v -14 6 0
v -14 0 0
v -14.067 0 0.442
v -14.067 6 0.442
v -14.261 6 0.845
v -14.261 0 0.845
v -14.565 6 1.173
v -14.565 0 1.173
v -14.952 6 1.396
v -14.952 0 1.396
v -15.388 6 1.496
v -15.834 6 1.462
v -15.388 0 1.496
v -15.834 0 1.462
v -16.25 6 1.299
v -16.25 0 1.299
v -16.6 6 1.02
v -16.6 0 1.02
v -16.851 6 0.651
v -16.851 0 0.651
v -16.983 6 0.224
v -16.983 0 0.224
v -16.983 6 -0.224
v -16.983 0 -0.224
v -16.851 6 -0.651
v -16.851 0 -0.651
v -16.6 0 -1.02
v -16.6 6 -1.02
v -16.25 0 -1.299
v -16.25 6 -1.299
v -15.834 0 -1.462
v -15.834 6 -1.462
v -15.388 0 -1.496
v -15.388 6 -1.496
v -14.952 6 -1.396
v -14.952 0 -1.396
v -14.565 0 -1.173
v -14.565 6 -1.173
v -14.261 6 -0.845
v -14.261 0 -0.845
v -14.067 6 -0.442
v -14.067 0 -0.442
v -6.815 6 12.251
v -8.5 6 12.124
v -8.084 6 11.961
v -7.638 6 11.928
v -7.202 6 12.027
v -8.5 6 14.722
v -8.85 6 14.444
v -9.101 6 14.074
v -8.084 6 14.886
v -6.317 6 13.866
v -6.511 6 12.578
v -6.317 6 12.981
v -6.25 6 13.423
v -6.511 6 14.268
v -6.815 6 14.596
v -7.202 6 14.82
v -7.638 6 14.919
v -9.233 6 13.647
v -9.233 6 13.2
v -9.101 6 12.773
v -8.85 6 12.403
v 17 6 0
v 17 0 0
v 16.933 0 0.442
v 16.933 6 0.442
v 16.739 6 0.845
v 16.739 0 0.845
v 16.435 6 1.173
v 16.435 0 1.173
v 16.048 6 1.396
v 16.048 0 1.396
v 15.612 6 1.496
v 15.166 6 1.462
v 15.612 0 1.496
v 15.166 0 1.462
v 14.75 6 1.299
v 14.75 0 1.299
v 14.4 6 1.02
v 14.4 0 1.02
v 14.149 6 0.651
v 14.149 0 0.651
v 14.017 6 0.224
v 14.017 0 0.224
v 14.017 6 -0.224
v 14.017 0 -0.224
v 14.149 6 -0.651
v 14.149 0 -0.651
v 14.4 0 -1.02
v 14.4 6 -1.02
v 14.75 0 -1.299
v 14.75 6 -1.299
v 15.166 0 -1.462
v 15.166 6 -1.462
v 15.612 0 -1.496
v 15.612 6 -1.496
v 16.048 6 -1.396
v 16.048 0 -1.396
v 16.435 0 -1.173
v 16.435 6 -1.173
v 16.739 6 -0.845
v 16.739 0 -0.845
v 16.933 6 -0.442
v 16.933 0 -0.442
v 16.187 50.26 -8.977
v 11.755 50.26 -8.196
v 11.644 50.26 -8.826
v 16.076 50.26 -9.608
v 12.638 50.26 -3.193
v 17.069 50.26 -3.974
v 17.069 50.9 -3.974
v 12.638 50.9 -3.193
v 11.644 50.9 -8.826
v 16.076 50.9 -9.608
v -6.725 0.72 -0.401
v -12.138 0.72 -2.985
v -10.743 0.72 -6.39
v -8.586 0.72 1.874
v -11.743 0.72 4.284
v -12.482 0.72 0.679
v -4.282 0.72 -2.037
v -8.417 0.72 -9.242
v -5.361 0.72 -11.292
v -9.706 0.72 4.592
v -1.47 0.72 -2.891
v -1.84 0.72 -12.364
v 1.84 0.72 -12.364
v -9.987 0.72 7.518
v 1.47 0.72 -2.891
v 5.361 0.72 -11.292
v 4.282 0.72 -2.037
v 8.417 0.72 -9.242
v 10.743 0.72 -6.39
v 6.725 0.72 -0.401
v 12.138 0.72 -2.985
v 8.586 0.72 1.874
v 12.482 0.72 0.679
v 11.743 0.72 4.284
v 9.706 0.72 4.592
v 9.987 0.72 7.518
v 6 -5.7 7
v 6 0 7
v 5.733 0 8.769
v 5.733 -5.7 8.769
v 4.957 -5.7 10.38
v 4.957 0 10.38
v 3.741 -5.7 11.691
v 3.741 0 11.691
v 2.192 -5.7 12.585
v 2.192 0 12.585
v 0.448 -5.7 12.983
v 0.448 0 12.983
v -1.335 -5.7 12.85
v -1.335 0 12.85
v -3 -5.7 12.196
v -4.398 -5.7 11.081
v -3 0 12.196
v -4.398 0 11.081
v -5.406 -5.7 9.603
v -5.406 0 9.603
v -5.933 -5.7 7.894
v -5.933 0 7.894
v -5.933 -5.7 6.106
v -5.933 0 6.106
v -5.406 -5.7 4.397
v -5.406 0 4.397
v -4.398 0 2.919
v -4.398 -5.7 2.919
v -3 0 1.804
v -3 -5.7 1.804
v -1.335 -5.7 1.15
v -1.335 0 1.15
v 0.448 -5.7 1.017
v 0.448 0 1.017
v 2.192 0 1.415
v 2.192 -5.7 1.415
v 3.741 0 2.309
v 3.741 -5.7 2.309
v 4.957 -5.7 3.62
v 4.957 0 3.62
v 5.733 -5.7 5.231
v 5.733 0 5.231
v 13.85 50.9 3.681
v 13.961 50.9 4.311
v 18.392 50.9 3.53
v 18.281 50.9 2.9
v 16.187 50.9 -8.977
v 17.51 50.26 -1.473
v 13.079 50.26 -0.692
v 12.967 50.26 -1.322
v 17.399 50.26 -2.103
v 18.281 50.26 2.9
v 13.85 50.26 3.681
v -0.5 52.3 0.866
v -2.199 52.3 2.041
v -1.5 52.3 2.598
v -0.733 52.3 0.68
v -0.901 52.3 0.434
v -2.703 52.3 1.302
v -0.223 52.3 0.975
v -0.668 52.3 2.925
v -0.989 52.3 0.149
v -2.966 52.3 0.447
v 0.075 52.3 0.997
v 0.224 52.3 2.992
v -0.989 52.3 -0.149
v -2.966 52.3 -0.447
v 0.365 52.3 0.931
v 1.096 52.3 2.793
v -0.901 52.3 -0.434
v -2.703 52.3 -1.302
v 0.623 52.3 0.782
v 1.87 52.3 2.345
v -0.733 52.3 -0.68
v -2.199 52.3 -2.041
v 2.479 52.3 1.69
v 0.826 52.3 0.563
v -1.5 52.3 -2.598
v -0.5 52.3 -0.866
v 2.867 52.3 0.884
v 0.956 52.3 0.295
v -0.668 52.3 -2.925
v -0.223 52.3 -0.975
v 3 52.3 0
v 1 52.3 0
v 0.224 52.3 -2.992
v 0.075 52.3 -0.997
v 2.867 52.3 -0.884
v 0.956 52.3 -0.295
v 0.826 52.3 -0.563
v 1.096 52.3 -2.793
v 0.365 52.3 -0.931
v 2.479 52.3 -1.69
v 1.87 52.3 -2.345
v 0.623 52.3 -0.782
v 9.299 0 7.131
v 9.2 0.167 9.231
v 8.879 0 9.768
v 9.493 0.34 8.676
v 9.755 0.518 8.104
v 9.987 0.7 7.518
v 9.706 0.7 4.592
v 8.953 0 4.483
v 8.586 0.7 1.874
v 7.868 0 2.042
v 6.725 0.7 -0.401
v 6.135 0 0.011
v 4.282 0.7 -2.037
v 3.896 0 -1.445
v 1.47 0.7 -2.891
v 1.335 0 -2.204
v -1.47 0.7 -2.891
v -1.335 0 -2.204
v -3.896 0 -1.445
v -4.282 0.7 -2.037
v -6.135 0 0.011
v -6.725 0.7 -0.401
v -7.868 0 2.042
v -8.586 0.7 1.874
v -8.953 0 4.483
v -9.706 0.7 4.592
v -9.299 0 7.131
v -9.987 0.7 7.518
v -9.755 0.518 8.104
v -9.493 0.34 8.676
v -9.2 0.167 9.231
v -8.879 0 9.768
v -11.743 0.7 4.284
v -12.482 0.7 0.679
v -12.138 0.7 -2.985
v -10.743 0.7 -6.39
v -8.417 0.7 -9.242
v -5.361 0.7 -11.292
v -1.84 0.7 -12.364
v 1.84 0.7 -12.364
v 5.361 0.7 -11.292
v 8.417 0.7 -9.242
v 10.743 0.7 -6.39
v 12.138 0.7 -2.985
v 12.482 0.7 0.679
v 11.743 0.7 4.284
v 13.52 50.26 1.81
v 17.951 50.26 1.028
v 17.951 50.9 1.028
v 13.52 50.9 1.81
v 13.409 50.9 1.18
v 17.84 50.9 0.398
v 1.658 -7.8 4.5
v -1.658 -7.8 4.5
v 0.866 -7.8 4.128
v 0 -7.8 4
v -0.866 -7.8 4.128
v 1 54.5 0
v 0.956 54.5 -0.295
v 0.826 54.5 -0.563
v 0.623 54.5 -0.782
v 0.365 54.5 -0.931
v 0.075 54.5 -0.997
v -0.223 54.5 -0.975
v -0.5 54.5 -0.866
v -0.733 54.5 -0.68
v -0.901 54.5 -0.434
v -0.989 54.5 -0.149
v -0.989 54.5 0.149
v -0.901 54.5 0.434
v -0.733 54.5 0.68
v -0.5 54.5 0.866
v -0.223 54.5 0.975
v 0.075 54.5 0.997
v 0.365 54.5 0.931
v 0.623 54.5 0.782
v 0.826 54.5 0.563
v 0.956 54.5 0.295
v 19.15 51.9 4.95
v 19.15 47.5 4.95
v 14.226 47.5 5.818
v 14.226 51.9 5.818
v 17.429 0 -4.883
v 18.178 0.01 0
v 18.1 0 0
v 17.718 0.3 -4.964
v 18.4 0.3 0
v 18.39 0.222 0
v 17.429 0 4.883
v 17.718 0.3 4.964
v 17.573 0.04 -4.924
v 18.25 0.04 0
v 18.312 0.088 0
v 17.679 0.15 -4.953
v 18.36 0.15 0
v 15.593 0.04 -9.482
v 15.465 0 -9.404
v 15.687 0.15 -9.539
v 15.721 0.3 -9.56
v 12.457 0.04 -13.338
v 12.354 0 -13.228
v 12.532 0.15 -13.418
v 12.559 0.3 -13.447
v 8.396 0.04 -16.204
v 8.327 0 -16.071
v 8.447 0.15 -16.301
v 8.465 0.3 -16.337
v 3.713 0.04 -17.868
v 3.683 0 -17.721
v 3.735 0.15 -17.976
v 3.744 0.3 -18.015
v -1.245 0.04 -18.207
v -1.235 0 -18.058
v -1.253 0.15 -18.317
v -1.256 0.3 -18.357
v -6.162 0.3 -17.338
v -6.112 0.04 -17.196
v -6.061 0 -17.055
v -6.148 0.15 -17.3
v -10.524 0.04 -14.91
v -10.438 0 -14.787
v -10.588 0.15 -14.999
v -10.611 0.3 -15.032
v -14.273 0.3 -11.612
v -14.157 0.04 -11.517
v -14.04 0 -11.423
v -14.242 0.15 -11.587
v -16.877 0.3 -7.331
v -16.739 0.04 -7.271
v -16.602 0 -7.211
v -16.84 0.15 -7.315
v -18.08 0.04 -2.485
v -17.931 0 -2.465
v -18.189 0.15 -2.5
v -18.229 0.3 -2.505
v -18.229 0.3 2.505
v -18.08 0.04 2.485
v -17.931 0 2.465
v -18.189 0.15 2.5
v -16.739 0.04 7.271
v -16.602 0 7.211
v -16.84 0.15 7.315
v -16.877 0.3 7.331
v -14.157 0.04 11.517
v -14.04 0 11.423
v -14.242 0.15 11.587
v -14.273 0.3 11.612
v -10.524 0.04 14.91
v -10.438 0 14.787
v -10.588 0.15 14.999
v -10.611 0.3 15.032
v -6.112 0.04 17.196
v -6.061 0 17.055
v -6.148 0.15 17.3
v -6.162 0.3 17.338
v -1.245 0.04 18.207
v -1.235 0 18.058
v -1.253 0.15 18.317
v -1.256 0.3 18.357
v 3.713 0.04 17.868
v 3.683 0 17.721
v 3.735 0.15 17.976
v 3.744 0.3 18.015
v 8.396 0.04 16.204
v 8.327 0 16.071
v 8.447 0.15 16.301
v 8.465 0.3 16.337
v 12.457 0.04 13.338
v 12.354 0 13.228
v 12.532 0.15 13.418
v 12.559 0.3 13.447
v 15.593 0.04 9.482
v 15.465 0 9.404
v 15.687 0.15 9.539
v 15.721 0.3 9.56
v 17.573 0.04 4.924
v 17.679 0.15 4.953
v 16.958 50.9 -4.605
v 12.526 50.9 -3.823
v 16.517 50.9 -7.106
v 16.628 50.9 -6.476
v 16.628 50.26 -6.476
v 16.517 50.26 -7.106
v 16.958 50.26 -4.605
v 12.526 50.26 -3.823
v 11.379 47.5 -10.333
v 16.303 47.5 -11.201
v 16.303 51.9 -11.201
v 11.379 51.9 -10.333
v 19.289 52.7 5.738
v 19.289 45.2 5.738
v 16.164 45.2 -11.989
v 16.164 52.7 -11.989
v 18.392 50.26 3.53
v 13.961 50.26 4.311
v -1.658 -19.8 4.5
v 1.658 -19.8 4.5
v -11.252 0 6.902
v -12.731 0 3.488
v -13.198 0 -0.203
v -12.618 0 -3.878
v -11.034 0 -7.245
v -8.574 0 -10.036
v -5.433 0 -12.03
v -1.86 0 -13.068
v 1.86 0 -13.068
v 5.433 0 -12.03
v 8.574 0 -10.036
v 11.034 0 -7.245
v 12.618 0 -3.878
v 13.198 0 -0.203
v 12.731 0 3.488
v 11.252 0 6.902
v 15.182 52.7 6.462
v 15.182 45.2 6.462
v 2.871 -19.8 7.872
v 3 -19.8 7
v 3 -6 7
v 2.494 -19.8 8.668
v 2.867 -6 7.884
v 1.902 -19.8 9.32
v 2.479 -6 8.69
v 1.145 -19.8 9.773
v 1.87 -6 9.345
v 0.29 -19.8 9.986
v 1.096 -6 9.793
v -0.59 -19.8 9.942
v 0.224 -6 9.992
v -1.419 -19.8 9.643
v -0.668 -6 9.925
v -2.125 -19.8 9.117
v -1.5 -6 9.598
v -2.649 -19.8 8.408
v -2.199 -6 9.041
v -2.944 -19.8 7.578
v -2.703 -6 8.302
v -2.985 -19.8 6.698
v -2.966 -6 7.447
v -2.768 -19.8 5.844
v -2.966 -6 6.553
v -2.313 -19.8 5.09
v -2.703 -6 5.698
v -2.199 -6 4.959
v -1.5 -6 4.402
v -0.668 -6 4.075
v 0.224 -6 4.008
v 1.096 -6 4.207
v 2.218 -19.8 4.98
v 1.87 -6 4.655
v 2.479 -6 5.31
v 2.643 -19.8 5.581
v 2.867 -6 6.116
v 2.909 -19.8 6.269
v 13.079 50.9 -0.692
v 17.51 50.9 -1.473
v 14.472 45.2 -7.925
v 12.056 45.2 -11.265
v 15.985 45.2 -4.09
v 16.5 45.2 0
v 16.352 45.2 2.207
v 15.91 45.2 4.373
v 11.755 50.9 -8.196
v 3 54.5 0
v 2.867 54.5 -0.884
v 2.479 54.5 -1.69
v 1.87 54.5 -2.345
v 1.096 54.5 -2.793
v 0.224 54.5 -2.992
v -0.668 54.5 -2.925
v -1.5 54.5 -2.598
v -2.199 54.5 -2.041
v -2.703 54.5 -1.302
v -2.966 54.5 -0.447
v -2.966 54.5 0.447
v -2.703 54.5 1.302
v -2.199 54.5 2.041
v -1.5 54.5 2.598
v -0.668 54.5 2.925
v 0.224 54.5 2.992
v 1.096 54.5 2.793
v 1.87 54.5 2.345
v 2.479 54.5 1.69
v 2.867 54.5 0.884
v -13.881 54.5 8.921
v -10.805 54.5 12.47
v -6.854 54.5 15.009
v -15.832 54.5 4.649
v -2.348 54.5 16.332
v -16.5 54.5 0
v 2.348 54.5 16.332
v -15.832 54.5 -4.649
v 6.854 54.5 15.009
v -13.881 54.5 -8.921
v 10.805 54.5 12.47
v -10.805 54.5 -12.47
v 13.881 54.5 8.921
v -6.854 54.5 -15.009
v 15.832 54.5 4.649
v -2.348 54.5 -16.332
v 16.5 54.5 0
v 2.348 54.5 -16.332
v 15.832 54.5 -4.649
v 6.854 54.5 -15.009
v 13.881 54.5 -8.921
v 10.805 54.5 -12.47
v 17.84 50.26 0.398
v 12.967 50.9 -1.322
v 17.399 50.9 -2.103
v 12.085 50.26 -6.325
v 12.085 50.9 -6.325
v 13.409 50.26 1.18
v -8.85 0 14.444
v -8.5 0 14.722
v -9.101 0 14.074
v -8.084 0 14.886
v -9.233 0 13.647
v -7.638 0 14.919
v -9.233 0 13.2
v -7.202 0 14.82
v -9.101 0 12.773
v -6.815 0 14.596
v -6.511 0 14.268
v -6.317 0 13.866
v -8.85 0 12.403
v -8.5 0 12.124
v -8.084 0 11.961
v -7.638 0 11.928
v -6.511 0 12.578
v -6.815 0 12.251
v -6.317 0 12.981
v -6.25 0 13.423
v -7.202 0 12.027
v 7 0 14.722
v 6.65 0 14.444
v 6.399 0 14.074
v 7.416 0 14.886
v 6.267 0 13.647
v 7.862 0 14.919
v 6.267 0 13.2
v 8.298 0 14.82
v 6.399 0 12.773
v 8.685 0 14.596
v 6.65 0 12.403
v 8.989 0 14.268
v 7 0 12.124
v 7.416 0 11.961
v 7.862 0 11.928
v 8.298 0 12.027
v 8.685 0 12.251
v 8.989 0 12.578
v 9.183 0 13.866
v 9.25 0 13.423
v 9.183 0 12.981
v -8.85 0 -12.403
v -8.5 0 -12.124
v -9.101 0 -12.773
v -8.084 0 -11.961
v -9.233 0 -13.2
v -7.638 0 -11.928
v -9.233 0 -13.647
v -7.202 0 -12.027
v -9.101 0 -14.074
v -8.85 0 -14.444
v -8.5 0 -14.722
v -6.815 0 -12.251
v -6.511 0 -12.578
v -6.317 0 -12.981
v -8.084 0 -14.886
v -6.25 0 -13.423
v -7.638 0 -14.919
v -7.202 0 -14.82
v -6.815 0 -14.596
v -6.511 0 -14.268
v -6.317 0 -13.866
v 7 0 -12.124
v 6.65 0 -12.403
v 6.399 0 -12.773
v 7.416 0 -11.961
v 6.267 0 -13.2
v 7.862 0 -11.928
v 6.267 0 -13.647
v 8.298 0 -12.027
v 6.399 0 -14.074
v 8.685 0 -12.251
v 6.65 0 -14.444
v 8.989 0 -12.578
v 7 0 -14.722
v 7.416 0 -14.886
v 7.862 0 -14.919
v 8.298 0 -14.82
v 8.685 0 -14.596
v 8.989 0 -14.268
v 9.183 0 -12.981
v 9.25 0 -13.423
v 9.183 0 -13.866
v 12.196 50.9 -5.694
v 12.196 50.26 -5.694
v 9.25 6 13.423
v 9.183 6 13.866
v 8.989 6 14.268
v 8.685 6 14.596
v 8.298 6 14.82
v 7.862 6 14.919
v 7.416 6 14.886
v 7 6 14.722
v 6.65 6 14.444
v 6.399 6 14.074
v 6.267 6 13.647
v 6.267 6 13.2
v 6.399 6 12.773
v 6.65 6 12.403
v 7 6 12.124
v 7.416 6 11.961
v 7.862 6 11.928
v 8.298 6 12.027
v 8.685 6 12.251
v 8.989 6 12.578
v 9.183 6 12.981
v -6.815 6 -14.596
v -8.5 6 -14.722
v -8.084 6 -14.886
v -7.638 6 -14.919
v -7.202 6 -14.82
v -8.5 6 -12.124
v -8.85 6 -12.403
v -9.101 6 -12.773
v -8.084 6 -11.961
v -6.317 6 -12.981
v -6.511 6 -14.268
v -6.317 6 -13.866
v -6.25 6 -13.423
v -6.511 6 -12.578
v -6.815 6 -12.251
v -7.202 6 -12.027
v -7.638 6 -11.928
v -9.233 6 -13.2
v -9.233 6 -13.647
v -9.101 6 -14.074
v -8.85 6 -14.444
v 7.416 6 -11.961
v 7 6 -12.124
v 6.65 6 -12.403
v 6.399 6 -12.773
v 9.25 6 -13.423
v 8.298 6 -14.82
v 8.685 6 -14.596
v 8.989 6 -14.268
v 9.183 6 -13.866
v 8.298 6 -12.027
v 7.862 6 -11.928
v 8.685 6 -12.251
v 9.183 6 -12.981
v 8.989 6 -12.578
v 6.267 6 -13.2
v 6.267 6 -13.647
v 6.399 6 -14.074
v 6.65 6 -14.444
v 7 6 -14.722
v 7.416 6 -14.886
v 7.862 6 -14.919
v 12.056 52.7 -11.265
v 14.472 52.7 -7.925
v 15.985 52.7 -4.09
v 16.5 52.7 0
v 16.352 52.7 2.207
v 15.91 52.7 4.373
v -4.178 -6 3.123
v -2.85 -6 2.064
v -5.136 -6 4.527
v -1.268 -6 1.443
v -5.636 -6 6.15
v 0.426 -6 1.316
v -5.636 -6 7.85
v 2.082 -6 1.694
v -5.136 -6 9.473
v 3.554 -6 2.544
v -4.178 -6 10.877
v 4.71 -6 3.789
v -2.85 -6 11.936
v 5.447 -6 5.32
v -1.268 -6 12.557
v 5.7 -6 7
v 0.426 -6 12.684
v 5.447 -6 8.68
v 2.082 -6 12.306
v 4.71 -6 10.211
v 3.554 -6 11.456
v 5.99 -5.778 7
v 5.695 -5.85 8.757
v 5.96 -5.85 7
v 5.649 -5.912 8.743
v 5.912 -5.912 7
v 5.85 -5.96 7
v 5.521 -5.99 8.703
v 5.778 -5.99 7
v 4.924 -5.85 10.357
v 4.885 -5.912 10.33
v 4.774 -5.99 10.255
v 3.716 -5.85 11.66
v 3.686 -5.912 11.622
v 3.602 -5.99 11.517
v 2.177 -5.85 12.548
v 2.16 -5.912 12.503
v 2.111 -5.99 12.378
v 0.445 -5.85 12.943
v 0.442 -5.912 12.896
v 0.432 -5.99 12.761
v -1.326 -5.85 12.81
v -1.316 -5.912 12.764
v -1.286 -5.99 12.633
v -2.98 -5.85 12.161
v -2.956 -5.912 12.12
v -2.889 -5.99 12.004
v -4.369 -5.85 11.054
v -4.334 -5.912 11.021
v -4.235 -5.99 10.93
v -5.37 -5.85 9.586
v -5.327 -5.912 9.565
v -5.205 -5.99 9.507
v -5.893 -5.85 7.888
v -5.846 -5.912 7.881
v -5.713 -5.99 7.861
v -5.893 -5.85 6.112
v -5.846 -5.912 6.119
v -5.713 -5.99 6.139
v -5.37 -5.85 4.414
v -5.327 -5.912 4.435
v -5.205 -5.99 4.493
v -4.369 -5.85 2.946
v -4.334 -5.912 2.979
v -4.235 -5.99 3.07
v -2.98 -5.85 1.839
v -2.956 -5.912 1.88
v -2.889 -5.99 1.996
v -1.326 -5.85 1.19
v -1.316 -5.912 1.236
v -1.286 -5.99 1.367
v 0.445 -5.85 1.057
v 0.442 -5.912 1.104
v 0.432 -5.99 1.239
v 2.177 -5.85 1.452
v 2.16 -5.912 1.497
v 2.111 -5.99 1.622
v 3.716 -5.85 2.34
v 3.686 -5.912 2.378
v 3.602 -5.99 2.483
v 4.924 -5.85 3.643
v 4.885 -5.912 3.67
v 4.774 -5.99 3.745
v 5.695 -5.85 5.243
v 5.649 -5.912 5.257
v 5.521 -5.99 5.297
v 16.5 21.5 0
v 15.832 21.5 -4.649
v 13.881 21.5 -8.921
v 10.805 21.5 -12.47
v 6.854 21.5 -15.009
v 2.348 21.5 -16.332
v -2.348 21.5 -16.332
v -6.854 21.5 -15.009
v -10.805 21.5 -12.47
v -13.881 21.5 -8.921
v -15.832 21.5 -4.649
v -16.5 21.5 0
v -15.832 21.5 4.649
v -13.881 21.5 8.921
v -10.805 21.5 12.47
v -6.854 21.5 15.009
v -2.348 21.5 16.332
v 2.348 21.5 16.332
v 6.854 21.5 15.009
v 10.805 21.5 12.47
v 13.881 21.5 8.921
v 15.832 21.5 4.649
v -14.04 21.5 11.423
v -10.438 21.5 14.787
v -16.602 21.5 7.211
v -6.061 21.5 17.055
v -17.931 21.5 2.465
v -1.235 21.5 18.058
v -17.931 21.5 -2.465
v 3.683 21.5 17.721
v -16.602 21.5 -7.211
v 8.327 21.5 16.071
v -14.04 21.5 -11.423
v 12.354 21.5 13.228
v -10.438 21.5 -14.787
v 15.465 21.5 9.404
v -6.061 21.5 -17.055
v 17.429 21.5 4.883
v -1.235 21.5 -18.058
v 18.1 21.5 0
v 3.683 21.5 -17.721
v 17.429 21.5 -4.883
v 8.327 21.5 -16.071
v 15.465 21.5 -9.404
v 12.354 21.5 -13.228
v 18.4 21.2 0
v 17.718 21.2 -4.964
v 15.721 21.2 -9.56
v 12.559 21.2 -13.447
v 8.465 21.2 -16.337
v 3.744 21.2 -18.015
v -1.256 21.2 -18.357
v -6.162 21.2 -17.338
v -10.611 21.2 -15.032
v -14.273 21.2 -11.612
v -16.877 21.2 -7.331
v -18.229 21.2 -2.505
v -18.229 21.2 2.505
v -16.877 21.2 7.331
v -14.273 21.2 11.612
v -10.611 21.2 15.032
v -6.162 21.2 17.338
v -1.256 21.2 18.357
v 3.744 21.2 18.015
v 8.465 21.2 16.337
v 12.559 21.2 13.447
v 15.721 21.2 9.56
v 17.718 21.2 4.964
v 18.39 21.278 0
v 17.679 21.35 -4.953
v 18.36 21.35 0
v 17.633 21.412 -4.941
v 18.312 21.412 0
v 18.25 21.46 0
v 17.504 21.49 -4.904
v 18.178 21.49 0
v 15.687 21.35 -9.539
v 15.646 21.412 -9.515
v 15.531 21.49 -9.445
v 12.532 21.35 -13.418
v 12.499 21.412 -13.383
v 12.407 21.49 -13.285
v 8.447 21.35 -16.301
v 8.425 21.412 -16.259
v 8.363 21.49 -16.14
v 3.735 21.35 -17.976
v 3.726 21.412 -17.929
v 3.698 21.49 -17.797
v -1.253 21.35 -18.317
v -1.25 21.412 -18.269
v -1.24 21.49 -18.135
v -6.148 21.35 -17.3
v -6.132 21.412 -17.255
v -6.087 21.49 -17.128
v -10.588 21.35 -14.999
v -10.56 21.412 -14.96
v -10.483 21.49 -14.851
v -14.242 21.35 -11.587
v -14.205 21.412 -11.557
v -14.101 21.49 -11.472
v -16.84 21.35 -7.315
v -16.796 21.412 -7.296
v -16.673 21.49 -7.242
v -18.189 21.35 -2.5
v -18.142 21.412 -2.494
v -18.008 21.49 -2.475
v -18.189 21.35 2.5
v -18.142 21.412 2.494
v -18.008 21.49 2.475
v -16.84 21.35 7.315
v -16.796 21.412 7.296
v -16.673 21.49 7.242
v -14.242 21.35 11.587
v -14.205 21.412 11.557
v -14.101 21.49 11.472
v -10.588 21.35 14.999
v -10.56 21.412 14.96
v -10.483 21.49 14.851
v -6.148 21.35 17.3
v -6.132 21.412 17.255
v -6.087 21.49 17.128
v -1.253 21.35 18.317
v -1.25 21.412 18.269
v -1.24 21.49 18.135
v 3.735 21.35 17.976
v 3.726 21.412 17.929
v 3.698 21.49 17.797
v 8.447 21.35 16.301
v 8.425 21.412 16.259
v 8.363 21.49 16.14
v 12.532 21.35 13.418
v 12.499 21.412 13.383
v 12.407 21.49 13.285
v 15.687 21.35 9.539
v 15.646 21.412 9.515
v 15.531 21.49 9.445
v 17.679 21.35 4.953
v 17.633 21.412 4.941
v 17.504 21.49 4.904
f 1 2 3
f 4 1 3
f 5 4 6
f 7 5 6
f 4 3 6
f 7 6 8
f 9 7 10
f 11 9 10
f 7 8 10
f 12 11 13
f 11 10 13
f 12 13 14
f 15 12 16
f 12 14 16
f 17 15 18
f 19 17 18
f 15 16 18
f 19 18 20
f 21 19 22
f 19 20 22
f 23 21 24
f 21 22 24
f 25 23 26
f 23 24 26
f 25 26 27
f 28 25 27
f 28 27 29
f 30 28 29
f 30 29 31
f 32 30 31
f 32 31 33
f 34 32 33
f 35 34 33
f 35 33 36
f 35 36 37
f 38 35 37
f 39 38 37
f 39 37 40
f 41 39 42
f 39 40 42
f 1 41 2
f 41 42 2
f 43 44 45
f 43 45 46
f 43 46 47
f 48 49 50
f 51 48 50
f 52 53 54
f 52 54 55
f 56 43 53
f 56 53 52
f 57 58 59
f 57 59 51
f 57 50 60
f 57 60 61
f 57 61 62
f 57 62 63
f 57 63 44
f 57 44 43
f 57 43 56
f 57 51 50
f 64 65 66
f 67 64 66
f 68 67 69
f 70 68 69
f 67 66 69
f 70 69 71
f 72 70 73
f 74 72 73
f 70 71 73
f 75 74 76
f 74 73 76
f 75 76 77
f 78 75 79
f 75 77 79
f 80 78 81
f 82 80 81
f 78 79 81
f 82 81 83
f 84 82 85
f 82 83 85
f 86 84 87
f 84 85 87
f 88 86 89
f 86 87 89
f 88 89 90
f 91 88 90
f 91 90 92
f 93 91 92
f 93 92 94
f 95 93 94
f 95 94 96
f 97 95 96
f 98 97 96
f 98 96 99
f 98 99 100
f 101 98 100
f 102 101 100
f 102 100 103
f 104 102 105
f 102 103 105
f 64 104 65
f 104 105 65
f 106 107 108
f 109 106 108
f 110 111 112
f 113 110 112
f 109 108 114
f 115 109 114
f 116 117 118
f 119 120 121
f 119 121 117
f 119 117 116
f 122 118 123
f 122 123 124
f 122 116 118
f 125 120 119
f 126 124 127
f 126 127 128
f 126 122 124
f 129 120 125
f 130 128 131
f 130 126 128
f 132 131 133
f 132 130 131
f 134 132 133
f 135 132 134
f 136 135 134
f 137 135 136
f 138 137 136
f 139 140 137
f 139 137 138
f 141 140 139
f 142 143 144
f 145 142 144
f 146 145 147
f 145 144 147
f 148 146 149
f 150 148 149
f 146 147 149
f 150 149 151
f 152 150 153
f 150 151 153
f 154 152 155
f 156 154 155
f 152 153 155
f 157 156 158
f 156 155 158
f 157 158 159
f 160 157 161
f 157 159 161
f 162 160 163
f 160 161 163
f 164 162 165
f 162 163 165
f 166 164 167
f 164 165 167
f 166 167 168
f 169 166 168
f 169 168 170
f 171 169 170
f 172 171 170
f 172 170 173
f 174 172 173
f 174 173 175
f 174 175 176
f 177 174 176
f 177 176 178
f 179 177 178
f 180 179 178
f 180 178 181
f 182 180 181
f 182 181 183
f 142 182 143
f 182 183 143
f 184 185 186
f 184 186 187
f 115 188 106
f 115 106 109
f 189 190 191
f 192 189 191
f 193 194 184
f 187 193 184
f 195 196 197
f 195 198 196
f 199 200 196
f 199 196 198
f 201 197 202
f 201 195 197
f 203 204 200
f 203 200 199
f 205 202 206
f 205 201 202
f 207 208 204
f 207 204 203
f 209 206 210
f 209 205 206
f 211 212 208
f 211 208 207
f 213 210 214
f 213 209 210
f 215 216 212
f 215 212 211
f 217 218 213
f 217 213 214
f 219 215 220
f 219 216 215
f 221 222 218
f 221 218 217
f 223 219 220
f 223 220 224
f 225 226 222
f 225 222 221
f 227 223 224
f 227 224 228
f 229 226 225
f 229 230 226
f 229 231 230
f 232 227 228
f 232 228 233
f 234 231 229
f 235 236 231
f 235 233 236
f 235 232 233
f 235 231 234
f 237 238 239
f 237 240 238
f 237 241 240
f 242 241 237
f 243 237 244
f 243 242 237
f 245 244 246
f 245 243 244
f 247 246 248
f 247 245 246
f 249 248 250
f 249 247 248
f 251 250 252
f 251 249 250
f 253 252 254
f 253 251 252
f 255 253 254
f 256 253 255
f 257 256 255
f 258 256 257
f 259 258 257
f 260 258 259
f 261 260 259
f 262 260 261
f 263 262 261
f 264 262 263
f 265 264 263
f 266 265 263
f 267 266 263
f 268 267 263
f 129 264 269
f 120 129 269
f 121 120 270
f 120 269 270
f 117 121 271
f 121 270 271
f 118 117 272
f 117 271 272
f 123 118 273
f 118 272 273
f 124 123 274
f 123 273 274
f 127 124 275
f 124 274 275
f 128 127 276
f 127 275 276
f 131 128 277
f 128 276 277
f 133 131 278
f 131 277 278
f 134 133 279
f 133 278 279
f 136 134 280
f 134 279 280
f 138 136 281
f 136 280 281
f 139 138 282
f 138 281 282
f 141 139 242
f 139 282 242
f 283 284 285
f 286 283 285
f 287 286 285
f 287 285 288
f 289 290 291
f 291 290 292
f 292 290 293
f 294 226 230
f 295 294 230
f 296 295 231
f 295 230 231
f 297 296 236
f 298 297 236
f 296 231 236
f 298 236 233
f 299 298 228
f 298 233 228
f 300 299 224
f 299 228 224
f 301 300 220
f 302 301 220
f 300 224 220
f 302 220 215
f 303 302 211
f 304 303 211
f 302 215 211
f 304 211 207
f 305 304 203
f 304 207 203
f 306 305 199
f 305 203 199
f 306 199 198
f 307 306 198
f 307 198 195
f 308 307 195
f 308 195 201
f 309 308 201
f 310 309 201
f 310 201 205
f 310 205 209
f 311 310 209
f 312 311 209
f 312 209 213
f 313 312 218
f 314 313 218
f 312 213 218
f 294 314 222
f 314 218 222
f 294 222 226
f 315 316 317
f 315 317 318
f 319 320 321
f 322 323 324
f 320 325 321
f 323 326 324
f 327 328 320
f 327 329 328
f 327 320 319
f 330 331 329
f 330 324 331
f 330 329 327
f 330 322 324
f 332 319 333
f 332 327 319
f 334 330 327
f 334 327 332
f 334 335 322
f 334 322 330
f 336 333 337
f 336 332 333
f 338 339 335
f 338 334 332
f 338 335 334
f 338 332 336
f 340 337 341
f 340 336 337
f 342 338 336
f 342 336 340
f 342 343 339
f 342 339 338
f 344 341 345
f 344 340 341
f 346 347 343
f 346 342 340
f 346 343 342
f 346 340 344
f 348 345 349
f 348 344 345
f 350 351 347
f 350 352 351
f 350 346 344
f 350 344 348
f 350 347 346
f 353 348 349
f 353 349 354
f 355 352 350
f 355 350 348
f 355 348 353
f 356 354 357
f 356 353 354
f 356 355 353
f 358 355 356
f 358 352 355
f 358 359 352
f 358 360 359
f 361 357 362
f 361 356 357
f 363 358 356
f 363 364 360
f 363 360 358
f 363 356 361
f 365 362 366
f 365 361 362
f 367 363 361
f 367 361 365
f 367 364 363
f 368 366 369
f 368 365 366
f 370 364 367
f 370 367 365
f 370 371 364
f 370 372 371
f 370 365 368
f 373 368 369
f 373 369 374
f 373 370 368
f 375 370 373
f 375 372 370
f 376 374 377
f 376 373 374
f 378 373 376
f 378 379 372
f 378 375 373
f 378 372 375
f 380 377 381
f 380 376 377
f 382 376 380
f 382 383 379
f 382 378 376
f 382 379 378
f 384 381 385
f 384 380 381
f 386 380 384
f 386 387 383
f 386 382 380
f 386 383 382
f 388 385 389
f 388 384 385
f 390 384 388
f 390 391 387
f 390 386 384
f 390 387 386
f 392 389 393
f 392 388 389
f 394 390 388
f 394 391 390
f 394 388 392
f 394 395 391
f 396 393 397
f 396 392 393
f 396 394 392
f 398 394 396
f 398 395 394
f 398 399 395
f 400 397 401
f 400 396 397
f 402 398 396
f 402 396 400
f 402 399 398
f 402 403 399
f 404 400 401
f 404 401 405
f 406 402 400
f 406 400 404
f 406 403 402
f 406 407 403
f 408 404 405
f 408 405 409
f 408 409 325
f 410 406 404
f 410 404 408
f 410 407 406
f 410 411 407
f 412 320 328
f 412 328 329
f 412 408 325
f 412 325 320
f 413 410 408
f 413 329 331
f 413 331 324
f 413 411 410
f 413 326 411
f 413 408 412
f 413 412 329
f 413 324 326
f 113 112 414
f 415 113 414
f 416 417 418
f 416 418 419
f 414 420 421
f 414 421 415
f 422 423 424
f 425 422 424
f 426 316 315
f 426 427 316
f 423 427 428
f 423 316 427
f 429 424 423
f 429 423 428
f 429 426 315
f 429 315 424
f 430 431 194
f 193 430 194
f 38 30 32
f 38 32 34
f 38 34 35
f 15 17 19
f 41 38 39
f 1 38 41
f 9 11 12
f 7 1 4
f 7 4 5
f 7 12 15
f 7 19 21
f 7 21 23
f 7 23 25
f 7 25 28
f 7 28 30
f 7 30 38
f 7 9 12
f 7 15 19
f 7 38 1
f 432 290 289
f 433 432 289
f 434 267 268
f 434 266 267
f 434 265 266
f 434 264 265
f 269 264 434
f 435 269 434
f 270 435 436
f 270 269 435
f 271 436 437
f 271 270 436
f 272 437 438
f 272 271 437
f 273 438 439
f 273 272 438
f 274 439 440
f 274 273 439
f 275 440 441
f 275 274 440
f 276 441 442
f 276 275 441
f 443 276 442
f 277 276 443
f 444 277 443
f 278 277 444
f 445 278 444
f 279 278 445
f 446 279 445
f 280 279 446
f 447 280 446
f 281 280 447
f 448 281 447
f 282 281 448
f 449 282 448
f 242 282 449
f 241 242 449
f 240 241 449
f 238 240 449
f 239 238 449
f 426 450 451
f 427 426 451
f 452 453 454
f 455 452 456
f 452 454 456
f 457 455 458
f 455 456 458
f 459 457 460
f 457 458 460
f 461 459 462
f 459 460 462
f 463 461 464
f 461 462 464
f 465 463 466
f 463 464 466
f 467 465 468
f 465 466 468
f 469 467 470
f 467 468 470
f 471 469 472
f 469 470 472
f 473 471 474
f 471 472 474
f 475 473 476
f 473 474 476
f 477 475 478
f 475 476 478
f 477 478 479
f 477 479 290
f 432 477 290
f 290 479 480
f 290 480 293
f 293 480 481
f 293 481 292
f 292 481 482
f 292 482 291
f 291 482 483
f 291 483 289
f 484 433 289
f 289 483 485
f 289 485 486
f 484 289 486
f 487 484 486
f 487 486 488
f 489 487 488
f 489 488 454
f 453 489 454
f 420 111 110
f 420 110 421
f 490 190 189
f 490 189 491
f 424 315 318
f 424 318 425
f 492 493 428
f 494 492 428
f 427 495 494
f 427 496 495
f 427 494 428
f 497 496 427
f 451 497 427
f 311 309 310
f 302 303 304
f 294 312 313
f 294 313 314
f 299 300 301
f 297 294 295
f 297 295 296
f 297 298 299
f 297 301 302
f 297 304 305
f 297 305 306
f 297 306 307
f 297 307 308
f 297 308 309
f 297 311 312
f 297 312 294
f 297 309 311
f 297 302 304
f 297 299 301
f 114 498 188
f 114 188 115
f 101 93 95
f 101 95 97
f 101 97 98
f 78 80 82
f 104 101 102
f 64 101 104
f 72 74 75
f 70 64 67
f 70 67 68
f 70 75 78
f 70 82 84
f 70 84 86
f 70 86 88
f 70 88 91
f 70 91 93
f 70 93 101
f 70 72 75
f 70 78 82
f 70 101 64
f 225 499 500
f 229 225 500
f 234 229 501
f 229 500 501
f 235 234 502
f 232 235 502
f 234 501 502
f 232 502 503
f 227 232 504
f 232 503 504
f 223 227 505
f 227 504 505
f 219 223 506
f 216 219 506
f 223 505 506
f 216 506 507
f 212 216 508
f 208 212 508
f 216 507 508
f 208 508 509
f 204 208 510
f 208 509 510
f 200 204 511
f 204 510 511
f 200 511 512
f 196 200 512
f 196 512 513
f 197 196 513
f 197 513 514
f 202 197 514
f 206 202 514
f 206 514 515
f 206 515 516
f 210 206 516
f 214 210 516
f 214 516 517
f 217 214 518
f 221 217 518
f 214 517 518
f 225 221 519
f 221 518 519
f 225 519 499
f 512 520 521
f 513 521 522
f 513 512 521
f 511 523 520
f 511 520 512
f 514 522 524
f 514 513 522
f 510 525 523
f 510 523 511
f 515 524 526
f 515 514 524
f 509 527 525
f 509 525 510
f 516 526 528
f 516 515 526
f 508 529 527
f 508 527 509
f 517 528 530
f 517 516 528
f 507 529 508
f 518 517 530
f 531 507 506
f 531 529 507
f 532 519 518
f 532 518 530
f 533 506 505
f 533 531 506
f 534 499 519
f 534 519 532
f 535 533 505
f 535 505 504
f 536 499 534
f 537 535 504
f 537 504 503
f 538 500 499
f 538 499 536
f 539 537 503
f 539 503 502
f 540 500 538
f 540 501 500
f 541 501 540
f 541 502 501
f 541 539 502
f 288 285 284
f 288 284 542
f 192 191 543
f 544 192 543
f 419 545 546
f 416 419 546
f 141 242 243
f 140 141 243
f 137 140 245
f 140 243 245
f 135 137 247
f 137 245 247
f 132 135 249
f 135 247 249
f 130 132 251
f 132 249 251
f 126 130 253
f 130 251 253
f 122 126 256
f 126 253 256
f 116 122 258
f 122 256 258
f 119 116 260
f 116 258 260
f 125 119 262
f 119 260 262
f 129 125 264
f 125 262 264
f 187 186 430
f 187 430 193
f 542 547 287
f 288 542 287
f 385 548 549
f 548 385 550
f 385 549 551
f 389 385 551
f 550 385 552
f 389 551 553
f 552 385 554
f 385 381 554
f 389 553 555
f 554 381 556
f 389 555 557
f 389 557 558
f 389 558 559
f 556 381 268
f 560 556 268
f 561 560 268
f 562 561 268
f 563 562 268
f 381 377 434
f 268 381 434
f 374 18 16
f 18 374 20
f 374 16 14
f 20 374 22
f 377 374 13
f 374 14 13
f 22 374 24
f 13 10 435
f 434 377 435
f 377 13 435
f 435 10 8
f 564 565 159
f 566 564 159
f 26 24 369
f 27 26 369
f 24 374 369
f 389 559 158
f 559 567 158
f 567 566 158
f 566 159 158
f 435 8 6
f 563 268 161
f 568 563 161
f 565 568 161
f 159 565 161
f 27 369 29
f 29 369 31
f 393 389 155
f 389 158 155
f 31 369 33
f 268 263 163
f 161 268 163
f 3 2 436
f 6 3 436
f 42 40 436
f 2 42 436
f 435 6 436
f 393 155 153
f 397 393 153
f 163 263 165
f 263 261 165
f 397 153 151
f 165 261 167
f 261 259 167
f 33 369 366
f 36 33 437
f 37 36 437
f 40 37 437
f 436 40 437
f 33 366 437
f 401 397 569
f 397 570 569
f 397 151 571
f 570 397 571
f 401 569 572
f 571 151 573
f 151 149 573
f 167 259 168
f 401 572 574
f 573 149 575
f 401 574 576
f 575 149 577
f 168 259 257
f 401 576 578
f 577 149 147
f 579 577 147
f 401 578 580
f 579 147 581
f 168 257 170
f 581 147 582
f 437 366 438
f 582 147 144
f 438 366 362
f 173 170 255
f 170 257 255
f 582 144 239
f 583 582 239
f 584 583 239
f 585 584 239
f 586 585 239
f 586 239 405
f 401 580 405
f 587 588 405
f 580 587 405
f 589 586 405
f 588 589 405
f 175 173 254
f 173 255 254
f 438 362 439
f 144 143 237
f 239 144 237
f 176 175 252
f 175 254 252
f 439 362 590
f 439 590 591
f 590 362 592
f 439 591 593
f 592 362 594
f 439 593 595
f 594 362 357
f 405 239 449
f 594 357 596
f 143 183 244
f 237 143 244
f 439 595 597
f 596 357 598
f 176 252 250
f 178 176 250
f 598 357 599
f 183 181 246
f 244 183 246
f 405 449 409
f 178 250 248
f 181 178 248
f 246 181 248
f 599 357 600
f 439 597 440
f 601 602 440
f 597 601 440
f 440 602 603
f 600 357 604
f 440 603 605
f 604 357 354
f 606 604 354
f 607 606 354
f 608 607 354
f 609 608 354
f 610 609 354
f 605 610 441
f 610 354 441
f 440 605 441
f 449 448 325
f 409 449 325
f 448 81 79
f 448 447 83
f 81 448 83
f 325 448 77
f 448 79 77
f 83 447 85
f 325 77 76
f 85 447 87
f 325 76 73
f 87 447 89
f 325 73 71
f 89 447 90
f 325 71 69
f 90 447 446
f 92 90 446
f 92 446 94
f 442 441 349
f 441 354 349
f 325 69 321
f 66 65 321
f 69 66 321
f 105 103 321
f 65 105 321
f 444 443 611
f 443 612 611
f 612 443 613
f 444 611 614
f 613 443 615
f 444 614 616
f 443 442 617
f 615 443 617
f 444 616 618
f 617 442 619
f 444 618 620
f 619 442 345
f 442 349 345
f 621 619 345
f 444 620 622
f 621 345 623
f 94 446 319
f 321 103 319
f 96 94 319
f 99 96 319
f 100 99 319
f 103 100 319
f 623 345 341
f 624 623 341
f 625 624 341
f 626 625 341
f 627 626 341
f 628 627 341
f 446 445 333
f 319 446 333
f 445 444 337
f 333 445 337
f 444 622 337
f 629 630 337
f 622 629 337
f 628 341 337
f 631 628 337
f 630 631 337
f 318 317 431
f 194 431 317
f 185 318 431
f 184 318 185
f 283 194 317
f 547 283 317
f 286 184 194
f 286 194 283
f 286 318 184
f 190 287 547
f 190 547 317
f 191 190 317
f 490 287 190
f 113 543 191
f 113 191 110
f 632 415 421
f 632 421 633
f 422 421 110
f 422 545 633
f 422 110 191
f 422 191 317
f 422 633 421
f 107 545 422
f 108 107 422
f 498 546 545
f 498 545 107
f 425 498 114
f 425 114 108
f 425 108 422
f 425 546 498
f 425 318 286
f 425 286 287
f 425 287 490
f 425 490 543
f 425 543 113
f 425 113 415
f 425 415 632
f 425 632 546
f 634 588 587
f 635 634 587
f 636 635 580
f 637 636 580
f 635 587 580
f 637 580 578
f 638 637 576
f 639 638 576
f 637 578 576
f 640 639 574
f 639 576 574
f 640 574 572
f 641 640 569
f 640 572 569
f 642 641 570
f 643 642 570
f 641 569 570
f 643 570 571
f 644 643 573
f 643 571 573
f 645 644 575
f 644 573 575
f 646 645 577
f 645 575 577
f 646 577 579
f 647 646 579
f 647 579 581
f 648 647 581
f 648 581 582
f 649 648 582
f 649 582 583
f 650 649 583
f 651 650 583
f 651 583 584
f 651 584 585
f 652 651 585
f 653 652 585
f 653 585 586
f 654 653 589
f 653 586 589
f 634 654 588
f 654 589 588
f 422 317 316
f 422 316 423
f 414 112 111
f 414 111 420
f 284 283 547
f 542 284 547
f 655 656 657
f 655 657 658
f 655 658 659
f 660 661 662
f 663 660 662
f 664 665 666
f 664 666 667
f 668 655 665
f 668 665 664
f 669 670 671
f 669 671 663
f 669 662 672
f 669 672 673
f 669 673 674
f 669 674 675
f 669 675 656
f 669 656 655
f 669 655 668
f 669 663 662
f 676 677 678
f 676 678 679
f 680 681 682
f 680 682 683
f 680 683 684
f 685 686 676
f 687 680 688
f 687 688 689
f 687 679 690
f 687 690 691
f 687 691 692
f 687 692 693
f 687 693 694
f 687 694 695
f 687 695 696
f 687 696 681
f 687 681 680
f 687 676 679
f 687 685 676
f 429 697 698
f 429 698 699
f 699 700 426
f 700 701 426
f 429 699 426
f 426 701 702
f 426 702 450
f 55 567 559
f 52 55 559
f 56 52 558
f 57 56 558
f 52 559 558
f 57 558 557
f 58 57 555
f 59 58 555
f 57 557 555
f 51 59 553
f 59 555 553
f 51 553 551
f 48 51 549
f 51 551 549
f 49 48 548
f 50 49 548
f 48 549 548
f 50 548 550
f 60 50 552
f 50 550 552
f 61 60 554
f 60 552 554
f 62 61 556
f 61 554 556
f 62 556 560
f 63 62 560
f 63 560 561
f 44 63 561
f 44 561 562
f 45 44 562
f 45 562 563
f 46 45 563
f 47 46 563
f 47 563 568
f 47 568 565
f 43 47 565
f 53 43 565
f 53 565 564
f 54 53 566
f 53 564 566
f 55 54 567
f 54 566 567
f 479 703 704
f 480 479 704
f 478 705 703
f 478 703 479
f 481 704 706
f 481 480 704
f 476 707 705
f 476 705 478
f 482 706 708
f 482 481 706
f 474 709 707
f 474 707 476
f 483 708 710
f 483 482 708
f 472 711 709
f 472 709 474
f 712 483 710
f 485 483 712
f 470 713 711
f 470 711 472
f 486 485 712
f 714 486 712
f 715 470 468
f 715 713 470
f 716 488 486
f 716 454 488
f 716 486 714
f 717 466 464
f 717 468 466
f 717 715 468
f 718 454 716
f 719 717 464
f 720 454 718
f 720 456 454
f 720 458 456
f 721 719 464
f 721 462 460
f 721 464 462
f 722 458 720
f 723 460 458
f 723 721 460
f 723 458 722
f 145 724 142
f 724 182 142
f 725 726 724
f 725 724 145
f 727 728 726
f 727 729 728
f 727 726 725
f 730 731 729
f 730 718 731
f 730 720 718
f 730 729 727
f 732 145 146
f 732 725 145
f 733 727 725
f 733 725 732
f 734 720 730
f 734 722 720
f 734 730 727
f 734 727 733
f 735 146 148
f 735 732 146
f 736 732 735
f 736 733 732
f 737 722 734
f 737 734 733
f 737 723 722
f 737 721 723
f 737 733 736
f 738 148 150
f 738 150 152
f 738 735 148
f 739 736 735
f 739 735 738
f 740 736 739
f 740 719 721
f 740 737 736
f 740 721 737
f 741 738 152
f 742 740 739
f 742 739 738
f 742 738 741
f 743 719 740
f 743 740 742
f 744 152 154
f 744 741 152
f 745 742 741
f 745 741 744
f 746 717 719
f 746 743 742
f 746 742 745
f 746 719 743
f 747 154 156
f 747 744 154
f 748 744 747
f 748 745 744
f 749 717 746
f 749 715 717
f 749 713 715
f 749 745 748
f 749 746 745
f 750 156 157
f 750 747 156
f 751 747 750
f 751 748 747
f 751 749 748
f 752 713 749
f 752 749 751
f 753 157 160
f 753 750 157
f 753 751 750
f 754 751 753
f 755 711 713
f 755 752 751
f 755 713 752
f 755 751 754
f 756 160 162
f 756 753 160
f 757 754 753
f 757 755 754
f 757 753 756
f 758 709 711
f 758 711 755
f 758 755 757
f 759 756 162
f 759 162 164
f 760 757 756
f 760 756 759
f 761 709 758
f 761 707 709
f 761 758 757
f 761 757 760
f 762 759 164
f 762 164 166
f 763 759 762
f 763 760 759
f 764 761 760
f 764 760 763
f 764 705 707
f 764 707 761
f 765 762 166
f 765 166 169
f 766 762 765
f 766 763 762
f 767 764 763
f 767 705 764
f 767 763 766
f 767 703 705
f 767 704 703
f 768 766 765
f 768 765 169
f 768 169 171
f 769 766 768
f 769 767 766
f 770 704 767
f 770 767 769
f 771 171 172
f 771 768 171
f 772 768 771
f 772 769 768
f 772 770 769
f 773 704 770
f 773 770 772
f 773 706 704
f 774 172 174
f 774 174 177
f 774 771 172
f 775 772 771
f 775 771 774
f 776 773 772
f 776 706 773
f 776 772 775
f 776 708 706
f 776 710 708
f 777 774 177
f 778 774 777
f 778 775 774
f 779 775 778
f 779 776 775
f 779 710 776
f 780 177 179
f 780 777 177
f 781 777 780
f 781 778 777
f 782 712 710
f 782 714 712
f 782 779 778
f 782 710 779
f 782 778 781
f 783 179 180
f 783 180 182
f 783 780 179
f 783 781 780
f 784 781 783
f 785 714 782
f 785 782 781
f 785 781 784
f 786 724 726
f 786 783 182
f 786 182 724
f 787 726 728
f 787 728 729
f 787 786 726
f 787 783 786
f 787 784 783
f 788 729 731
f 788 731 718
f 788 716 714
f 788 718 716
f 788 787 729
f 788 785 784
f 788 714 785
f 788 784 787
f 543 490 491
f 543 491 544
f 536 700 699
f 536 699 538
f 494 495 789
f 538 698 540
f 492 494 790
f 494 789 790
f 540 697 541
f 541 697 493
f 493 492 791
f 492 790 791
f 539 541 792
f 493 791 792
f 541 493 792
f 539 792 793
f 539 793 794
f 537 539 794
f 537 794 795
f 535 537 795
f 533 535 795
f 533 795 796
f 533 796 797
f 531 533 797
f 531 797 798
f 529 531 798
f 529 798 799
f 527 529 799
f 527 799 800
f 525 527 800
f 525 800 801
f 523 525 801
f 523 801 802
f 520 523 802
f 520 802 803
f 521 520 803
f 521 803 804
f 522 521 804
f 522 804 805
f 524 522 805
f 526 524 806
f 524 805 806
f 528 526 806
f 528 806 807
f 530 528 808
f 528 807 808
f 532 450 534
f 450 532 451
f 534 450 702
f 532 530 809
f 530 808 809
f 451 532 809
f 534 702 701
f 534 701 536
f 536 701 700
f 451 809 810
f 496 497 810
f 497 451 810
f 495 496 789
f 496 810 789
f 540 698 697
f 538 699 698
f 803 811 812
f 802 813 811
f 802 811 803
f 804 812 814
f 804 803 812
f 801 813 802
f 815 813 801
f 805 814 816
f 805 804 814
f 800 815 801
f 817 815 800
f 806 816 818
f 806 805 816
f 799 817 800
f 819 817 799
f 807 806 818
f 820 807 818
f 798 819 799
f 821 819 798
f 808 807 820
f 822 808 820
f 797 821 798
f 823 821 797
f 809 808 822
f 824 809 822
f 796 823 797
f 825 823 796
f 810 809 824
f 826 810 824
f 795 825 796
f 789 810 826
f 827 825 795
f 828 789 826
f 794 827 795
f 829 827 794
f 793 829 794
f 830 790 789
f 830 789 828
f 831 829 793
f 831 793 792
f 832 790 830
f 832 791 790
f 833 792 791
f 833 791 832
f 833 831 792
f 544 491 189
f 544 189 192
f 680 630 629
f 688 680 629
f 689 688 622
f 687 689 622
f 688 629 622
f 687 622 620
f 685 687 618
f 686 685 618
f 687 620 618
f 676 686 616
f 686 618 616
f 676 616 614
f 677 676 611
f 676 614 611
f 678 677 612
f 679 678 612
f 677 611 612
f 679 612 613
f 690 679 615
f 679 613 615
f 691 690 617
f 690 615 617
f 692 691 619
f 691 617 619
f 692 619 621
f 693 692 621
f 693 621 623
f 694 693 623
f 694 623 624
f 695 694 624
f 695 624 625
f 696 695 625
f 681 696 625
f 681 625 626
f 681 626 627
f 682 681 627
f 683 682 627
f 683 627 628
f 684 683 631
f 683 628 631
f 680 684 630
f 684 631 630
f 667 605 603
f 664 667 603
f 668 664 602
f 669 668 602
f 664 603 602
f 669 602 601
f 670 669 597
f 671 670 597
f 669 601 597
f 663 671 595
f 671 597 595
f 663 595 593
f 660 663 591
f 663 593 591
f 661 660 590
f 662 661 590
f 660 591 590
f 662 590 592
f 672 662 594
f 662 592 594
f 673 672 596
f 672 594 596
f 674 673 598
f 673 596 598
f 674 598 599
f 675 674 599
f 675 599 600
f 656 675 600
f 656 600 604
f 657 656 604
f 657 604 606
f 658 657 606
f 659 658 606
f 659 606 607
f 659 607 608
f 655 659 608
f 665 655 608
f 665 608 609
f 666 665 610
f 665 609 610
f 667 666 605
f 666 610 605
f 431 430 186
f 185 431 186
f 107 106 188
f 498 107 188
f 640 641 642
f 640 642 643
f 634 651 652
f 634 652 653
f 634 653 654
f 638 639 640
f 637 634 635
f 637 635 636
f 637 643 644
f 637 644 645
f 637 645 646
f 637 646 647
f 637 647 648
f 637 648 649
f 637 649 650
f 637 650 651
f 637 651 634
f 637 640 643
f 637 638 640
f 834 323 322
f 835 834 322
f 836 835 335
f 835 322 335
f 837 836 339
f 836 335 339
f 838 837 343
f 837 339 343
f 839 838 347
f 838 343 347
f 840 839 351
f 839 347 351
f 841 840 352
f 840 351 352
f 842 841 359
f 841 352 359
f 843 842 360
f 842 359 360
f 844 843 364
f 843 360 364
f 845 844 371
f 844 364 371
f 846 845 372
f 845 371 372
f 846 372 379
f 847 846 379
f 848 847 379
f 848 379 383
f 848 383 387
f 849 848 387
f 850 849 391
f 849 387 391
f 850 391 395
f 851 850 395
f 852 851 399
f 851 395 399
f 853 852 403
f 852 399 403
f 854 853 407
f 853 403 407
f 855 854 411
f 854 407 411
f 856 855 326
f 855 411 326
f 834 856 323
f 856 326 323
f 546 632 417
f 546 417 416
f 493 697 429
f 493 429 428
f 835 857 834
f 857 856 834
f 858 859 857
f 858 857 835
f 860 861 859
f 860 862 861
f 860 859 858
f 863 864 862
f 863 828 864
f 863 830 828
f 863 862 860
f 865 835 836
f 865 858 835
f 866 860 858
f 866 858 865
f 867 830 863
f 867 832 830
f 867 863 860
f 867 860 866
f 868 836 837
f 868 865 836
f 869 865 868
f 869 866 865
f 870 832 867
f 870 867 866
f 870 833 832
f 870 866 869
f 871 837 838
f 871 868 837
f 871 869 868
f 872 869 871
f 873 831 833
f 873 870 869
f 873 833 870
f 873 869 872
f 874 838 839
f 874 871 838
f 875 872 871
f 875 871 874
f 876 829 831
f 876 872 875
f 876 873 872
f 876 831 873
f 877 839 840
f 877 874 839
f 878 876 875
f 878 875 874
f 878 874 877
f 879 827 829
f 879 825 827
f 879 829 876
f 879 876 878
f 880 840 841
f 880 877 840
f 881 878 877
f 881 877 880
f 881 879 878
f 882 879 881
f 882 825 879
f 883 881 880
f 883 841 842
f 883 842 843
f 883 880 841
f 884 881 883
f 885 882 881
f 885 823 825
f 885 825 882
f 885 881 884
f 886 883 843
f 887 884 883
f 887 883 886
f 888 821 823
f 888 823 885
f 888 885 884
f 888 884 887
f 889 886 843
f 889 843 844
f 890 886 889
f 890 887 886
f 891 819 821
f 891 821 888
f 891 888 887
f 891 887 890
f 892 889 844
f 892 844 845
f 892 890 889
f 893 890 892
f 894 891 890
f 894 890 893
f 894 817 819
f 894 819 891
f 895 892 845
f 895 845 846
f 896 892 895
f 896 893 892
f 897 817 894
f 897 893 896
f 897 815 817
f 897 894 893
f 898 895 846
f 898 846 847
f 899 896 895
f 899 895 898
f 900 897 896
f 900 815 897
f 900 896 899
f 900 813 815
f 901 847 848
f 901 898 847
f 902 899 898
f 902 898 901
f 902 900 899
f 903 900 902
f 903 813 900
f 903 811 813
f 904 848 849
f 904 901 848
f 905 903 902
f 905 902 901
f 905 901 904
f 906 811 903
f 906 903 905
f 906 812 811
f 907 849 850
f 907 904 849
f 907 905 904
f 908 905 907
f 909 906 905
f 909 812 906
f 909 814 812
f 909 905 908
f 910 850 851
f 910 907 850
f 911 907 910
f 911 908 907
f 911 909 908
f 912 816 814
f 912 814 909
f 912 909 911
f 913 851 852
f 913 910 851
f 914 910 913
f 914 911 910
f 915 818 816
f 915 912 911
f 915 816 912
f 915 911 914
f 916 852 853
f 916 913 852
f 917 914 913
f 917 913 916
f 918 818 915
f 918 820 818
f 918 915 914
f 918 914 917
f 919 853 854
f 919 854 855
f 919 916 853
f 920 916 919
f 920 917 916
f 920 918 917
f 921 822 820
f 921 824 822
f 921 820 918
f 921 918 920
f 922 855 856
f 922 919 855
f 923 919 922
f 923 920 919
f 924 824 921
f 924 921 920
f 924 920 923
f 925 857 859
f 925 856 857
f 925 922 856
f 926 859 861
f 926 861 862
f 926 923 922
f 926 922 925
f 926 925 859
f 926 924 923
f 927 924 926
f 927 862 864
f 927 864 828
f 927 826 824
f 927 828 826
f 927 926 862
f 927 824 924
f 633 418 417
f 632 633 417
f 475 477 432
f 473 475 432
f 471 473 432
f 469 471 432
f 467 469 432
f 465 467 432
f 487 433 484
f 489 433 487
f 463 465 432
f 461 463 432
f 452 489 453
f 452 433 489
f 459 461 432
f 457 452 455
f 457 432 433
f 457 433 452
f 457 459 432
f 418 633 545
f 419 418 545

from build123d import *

# Parameters (mm, degrees)
SKETCH_1_R          = 18.4
EXTRUDE_1_DEPTH     = 21.5
SKETCH_2_R          = 6
EXTRUDE_2_DEPTH     = 6
SKETCH_3_R          = 3
EXTRUDE_3_DEPTH     = 13.8
SKETCH_4_W          = 8.972007795
SKETCH_4_H          = 2.543787651
CUT_EXTRUDE_1_DEPTH = 12
SKETCH_6_R          = 1.5
CUT_EXTRUDE_2_DEPTH = 6
CUT_EXTRUDE_3_DEPTH = 0.72
SKETCH_8_R          = 16.5
EXTRUDE_4_DEPTH     = 33
SKETCH_10_W         = 7.5
SKETCH_10_H         = 18
EXTRUDE_5_DEPTH     = 18
SKETCH_11_W         = 16.4
SKETCH_11_H         = 5.9
CUT_EXTRUDE_4_DEPTH = 5
SKETCH_12_W         = 0.64
SKETCH_12_H         = 0.64
EXTRUDE_6_DEPTH     = 4.5
SKETCH_13_W         = 16.4
SKETCH_13_H         = 1.5
EXTRUDE_7_DEPTH     = 5
SKETCH_14_R         = 3
CUT_EXTRUDE_5_DEPTH = 2.2
SKETCH_15_R         = 1
EXTRUDE_8_DEPTH     = 2.2
CHAMFER_1_SIZE      = 0.7
FILLET_1_R          = 0.3
FILLET_2_R          = 0.3


with BuildPart() as part:
    # 草图1 → 凸台-拉伸1 (new body)
    with BuildSketch(Plane(origin=(0, 0, 0), x_dir=(1, 0, 0), z_dir=(0, 1, 0))):
        Circle(SKETCH_1_R)
    extrude(amount=EXTRUDE_1_DEPTH)

    # 草图2 → 凸台-拉伸2 (add)
    with BuildSketch(Plane.XZ):
        with Locations((0, 7)):
            Circle(SKETCH_2_R)
    extrude(amount=EXTRUDE_2_DEPTH)

    # 草图3 → 凸台-拉伸3 (add)
    with BuildSketch(Plane.XZ.offset(6)):
        with Locations((0, 7)):
            Circle(SKETCH_3_R)
    extrude(amount=EXTRUDE_3_DEPTH)

    # 草图4 → 切除-拉伸1 (cut)
    with BuildSketch(Plane.XZ.offset(19.8)):
        with Locations((-0.051563263, 3.228106175)):
            Rectangle(SKETCH_4_W, SKETCH_4_H)
    extrude(amount=-CUT_EXTRUDE_1_DEPTH, mode=Mode.SUBTRACT)

    # 草图6 → 切除-拉伸2 (cut)
    with BuildSketch(Plane.XZ):
        with Locations((-15.5, 0)):
            Circle(SKETCH_6_R)
        with Locations((-7.75, 13.423393759)):
            Circle(SKETCH_6_R)
        with Locations((7.75, 13.423393759)):
            Circle(SKETCH_6_R)
        with Locations((15.5, 0)):
            Circle(SKETCH_6_R)
        with Locations((7.75, -13.423393759)):
            Circle(SKETCH_6_R)
        with Locations((-7.75, -13.423393759)):
            Circle(SKETCH_6_R)
    extrude(amount=-CUT_EXTRUDE_2_DEPTH, mode=Mode.SUBTRACT)

    # 草图7 → 切除-拉伸3 (cut)
    with BuildSketch(Plane.XZ):
        with BuildLine():
            ThreePointArc((-9.986582197, 7.517857143), (0, -12.5), (9.986582197, 7.517857143))
            ThreePointArc((9.986582197, 7.517857143), (0, -3), (-9.986582197, 7.517857143))
        make_face()
    extrude(amount=-CUT_EXTRUDE_3_DEPTH, mode=Mode.SUBTRACT)

    # 草图8 → 凸台-拉伸4 (add)
    with BuildSketch(Plane(origin=(0, 21.5, 0), x_dir=(1, 0, 0), z_dir=(0, 1, 0))):
        Circle(SKETCH_8_R)
    extrude(amount=EXTRUDE_4_DEPTH)

    # 草图10 → 凸台-拉伸5 (add)
    with BuildSketch(Plane(origin=(0, 0, 0), x_dir=(0, -1, 0), z_dir=(-0.984807753, 0, 0.173648178))):
        with Locations((-48.95, 0)):
            Rectangle(SKETCH_10_W, SKETCH_10_H)
    extrude(amount=-EXTRUDE_5_DEPTH)

    # 草图11 → 切除-拉伸4 (cut)
    with BuildSketch(Plane(origin=(17.726539554, 0, -3.125667198), x_dir=(-0.173648178, 0, -0.984807753), z_dir=(0.984807753, 0, -0.173648178))):
        with Locations((0, 48.95)):
            Rectangle(SKETCH_11_W, SKETCH_11_H)
    extrude(amount=-CUT_EXTRUDE_4_DEPTH, mode=Mode.SUBTRACT)

    # 草图12 → 凸台-拉伸6 (add)
    with BuildSketch(Plane(origin=(12.802500789, 0, -2.25742631), x_dir=(-0.173648178, 0, -0.984807753), z_dir=(0.984807753, 0, -0.173648178))):
        with Locations((-1.27, 50.58)):
            Rectangle(SKETCH_12_W, SKETCH_12_H)
        with Locations((1.27, 50.58)):
            Rectangle(SKETCH_12_W, SKETCH_12_H)
        with Locations((3.81, 50.58)):
            Rectangle(SKETCH_12_W, SKETCH_12_H)
        with Locations((6.35, 50.58)):
            Rectangle(SKETCH_12_W, SKETCH_12_H)
        with Locations((-6.35, 50.58)):
            Rectangle(SKETCH_12_W, SKETCH_12_H)
        with Locations((-3.81, 50.58)):
            Rectangle(SKETCH_12_W, SKETCH_12_H)
    extrude(amount=EXTRUDE_6_DEPTH)

    # 草图13 → 凸台-拉伸7 (add)
    with BuildSketch(Plane(origin=(12.802500789, 0, -2.25742631), x_dir=(-0.173648178, 0, -0.984807753), z_dir=(0.984807753, 0, -0.173648178))):
        with Locations((0, 46.75)):
            Rectangle(SKETCH_13_W, SKETCH_13_H)
    extrude(amount=EXTRUDE_7_DEPTH)

    # 草图14 → 切除-拉伸5 (cut)
    with BuildSketch(Plane(origin=(0, 54.5, 0), x_dir=(1, 0, 0), z_dir=(0, 1, 0))):
        Circle(SKETCH_14_R)
    extrude(amount=-CUT_EXTRUDE_5_DEPTH, mode=Mode.SUBTRACT)

    # 草图15 → 凸台-拉伸8 (add)
    with BuildSketch(Plane(origin=(0, 52.3, 0), x_dir=(1, 0, 0), z_dir=(0, 1, 0))):
        Circle(SKETCH_15_R)
    extrude(amount=EXTRUDE_8_DEPTH)

    # 倒角1
    chamfer_1_edges = [part.edges().sort_by_distance(p)[0] for p in [
        (0, 0, -12.5),
        (0, 0, -3),
    ]]
    chamfer(chamfer_1_edges, length=CHAMFER_1_SIZE)

    # 圆角1
    fillet_1_edges = [part.edges().sort_by_distance(p)[0] for p in [
        (-6, -6, 7),
    ]]
    fillet(fillet_1_edges, radius=FILLET_1_R)

    # 圆角2
    fillet_2_edges = [part.edges().sort_by_distance(p)[0] for p in [
        (-18.4, 0, 0),
        (-18.4, 21.5, 0),
    ]]
    fillet(fillet_2_edges, radius=FILLET_2_R)


solid = part.part
